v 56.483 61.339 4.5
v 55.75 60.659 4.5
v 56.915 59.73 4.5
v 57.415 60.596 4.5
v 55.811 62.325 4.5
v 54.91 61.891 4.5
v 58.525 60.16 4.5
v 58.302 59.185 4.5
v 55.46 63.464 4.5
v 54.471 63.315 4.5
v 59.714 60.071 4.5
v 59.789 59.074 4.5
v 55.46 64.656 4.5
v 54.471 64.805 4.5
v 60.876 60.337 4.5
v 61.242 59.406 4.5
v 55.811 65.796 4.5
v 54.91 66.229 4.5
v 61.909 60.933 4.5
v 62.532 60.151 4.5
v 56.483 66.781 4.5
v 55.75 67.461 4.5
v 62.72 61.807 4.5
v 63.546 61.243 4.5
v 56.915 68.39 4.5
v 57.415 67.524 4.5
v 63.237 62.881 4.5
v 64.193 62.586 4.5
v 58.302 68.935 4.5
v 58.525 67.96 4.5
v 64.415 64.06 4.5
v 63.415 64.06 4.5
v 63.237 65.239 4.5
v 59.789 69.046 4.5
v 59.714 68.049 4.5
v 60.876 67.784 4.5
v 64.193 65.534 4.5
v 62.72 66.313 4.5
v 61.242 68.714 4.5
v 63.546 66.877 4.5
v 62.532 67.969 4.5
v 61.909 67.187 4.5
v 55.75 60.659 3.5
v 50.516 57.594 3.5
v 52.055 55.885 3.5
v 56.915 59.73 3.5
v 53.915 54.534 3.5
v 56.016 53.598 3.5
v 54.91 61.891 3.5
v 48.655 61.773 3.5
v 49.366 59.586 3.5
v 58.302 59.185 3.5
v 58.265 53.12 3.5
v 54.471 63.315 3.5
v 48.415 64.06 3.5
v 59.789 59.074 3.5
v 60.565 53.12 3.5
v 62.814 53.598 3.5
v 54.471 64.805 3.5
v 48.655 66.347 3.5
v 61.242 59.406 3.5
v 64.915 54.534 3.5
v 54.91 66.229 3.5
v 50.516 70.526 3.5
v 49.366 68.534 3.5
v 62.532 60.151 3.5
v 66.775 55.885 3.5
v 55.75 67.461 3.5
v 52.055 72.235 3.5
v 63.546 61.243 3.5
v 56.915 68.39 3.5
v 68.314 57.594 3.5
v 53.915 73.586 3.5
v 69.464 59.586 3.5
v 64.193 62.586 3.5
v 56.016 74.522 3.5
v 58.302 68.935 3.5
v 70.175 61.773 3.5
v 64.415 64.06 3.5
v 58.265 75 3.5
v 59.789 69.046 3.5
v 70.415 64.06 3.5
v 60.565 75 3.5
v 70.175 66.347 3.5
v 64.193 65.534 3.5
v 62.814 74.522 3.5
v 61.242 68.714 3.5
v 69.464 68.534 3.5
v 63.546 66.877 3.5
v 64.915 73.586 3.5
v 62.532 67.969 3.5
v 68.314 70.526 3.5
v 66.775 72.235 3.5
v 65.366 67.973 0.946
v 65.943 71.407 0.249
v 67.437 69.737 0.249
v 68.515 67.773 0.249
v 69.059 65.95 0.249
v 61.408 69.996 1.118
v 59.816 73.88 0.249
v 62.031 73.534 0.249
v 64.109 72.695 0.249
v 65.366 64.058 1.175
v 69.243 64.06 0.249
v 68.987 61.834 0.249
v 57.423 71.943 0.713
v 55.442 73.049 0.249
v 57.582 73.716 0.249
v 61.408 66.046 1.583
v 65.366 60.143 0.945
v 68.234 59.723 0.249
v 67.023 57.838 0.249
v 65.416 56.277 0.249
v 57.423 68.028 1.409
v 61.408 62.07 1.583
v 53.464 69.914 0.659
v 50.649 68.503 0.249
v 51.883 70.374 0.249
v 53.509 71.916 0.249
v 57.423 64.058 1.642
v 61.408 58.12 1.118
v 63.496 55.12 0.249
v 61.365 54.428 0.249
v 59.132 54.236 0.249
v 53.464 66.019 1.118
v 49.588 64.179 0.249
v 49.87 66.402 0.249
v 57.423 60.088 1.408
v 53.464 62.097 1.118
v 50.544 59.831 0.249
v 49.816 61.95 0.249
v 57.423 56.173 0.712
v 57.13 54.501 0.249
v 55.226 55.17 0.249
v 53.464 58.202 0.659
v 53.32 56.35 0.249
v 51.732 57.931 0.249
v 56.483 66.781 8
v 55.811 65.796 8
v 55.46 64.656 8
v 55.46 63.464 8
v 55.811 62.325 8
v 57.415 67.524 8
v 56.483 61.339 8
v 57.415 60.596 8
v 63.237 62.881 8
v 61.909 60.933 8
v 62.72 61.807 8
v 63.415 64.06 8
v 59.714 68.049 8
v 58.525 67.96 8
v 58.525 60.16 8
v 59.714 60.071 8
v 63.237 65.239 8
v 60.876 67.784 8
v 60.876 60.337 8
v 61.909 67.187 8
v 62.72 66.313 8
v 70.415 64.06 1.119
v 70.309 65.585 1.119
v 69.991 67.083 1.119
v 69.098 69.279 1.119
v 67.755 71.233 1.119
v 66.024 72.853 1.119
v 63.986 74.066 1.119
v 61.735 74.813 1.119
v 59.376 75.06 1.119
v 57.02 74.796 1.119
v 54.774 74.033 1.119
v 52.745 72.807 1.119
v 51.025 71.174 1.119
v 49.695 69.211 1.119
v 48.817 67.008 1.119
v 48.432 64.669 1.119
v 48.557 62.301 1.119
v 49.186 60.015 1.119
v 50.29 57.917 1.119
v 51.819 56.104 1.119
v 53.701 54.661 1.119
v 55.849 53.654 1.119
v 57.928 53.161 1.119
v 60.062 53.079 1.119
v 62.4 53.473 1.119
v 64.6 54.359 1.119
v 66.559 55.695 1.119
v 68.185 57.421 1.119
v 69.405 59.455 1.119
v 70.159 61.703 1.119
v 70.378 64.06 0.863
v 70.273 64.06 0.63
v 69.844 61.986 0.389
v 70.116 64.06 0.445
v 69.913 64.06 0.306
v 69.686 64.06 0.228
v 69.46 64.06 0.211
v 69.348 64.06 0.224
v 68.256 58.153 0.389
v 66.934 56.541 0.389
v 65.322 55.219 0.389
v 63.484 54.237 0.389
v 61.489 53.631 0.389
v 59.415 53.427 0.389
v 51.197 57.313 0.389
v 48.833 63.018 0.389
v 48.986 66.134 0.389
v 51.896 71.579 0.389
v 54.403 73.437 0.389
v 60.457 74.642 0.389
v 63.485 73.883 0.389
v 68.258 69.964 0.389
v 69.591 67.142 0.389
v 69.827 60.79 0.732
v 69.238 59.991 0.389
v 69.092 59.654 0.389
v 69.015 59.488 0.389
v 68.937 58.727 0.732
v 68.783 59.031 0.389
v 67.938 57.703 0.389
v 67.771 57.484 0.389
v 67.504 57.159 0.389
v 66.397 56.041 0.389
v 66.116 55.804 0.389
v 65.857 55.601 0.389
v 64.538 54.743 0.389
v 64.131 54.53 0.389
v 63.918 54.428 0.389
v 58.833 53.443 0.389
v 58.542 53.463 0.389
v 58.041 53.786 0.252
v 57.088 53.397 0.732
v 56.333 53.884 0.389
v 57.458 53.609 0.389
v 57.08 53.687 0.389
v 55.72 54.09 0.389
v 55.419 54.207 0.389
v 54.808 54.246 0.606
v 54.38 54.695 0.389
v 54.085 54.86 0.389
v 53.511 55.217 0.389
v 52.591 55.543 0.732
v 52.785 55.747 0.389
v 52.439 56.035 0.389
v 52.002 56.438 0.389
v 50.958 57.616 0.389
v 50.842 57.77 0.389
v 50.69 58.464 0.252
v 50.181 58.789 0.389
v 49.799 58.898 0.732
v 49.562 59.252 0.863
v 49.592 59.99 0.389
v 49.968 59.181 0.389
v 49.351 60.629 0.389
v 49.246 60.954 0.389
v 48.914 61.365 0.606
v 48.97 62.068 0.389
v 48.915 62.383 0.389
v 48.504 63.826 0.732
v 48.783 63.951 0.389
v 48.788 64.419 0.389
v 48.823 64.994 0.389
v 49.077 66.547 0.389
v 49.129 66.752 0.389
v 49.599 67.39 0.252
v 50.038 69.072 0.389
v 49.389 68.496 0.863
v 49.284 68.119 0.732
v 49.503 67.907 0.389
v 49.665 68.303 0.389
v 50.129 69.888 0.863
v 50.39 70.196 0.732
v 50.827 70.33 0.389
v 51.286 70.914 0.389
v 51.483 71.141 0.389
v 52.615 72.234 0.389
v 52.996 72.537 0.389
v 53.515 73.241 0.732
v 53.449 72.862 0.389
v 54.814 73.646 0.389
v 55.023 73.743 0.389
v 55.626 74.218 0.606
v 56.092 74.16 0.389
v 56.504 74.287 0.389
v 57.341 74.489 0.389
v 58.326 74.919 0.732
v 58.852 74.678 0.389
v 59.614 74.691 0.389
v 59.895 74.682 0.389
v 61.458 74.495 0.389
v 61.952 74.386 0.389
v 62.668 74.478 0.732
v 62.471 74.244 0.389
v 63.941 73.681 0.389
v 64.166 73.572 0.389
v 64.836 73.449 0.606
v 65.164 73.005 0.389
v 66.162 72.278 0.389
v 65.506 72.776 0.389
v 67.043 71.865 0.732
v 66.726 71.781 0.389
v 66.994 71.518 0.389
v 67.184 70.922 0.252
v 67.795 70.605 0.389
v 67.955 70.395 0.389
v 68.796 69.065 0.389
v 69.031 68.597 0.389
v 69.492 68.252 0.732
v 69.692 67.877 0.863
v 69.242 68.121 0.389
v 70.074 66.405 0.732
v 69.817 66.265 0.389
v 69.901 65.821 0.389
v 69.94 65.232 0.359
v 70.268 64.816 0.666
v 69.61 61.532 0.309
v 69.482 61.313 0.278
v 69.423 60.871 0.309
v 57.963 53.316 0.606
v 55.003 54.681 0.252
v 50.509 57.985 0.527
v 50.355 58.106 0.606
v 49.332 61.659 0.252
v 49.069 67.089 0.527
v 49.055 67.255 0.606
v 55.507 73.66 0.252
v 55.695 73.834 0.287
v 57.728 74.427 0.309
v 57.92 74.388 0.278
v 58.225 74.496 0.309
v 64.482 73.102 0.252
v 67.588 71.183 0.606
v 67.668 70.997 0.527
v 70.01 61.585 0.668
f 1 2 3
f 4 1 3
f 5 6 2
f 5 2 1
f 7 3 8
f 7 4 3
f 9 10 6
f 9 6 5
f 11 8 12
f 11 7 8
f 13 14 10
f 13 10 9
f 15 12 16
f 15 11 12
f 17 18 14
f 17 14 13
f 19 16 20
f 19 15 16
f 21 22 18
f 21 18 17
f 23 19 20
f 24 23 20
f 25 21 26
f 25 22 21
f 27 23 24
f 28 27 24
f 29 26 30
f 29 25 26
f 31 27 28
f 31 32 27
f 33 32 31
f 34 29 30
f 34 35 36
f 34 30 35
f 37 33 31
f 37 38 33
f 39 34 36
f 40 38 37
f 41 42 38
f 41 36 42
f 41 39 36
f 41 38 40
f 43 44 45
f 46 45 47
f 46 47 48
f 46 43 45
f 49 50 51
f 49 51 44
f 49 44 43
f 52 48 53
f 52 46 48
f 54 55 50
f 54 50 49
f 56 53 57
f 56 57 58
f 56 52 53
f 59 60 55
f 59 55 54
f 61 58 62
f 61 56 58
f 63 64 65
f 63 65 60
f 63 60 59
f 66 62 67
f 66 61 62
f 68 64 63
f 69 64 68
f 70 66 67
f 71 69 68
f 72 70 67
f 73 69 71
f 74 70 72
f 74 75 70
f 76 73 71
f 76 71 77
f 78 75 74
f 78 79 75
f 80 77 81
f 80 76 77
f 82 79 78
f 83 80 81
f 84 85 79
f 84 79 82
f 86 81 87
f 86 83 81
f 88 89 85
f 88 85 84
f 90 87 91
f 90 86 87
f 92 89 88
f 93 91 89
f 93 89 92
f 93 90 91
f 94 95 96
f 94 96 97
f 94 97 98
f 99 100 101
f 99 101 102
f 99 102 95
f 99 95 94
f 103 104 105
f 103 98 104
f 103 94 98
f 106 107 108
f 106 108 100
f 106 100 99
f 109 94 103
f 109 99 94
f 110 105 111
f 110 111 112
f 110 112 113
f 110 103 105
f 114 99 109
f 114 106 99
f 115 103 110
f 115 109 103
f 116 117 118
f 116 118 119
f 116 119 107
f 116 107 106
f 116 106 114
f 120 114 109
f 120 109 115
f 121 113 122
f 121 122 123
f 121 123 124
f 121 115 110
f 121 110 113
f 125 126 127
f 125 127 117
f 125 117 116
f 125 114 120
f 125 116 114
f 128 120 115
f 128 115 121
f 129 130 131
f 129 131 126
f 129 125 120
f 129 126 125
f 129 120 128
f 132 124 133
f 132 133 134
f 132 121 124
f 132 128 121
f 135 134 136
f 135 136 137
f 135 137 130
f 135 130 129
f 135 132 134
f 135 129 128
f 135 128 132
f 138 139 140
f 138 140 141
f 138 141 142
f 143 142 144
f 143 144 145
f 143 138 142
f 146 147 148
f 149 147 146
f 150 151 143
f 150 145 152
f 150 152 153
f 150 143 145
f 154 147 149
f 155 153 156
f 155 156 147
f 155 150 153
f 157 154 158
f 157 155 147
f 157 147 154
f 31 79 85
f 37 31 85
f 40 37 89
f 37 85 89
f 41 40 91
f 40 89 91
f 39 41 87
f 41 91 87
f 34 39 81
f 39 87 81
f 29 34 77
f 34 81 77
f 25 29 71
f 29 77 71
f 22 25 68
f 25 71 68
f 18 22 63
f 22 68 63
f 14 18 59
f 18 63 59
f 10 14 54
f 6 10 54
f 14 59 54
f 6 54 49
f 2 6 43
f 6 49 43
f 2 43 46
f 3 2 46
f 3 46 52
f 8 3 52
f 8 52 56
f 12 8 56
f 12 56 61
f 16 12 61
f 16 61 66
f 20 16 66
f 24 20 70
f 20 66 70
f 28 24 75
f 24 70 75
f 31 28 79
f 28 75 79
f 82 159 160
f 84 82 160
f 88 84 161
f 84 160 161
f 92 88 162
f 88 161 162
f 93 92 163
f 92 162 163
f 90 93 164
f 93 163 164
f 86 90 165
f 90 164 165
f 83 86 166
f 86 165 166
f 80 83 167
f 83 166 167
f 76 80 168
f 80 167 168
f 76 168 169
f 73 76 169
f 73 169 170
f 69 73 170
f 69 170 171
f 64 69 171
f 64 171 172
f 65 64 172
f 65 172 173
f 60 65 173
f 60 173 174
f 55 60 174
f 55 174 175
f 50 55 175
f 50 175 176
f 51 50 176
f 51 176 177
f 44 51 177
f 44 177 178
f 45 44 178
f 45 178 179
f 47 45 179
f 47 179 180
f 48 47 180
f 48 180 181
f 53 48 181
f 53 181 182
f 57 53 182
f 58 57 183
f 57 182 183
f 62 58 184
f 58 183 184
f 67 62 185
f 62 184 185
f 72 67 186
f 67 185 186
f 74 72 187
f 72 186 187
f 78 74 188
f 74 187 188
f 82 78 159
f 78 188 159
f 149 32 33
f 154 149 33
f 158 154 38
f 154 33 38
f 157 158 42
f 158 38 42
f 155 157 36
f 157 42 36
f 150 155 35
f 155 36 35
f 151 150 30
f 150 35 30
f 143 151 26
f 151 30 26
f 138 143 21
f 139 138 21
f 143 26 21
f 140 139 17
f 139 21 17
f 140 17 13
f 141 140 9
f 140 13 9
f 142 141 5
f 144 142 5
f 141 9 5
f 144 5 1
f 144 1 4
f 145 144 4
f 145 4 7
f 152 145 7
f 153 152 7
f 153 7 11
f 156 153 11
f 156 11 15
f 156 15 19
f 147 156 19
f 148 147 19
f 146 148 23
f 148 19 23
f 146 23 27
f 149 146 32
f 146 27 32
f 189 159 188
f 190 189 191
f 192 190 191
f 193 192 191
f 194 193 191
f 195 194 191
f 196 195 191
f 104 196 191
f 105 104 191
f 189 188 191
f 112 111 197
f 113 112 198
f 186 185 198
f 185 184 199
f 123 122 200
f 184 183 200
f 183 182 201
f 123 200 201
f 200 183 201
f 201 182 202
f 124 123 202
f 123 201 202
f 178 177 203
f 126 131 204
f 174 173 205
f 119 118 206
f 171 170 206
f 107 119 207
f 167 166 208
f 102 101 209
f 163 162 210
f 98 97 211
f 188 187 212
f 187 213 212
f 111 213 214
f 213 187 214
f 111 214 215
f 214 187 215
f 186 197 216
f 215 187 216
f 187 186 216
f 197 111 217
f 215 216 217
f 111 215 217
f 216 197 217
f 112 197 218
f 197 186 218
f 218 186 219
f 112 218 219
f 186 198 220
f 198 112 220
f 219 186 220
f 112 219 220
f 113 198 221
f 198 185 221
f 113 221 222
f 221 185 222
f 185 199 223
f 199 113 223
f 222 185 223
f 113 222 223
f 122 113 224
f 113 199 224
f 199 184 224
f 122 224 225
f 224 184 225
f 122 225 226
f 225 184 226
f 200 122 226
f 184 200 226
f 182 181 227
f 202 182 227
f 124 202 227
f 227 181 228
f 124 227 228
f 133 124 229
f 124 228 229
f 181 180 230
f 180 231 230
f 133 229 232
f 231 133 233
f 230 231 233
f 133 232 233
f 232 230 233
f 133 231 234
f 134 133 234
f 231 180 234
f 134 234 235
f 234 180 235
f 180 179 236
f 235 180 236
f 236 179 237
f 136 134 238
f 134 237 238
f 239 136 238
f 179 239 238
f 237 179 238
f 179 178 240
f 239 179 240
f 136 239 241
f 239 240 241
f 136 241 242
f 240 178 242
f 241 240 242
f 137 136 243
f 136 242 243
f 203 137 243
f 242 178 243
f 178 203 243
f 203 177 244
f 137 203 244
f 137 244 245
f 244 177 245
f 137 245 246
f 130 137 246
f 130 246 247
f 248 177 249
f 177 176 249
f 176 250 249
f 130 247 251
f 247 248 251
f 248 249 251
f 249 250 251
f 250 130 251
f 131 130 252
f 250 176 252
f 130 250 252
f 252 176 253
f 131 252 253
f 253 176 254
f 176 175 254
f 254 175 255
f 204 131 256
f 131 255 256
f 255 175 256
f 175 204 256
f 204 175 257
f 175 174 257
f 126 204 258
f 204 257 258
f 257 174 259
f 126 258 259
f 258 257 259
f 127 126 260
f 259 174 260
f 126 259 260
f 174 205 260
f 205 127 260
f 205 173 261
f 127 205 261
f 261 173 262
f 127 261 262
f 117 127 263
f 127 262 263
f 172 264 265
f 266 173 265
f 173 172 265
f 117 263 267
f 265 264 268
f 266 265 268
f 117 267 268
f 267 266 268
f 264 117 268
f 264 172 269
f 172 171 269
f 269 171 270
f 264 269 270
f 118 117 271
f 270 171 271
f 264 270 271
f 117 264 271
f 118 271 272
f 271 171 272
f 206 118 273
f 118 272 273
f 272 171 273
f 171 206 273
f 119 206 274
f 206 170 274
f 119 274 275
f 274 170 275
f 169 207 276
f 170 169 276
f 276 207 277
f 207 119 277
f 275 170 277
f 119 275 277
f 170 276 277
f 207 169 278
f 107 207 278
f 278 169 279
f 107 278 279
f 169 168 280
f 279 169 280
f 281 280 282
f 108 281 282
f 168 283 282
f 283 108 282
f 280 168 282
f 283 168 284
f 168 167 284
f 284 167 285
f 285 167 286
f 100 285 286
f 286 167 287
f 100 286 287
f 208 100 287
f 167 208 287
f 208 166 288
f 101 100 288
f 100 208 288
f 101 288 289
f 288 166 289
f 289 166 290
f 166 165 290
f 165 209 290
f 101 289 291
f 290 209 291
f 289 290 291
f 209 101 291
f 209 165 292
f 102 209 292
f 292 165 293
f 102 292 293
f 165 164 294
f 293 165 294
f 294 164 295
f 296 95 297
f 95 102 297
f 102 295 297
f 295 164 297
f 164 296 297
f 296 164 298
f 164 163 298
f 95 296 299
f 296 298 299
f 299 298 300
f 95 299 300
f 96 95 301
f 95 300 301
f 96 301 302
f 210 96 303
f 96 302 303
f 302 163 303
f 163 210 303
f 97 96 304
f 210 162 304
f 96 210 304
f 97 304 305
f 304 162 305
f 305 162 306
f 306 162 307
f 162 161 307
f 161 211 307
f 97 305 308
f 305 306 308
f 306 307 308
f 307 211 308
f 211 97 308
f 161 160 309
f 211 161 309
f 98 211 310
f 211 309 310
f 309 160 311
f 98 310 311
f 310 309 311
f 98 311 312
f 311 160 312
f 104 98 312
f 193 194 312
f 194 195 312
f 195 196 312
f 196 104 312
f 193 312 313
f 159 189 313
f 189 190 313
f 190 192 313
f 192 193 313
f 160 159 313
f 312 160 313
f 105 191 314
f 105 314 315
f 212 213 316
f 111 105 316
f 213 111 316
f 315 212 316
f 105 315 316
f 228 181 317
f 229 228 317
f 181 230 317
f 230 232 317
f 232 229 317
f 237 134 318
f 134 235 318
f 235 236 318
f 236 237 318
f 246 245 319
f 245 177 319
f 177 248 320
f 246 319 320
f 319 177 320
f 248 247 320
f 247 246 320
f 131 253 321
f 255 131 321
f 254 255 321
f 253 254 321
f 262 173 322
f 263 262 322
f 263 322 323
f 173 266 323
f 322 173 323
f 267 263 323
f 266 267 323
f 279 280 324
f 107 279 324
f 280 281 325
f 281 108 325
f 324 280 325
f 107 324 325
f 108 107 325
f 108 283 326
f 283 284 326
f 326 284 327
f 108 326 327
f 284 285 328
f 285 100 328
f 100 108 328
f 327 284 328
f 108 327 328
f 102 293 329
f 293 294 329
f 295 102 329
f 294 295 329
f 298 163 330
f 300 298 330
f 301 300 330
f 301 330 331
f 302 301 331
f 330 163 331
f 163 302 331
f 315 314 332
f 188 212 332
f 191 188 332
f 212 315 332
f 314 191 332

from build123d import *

# Parameters (mm, degrees)
F0_R     = 11
F1_DEPTH = 3.5
F2_R     = 5
F3_DEPTH = 1
F4_R     = 4
F5_DEPTH = 3.5
F6_R     = 1.3518679975
F7_DEPTH = 32.3
F11_R    = 0.9092071391


# Not quite as in the source:
# - a fillet or chamfer that OpenCascade refuses, or shapes differently, is made with other operations: its cross-section is extruded or revolved along the edge and cut away or added
# - a feature names something its author has since deleted; it is built from what else it names


with BuildPart() as f1:
    # F0 (on Top) → F1 (new body)
    with BuildSketch(Plane.XY):
        with Locations((59.4149753451, 64.0600547194)):
            Circle(F0_R)
    extrude(amount=F1_DEPTH)

    # F2 (on face) → F3 (join)
    with BuildSketch(Plane.XY.offset(3.5)):
        with Locations((59.4149753451, 64.0600547194)):
            Circle(F2_R)
    extrude(amount=F3_DEPTH)

    # F4 (on face) → F5 (join)
    with BuildSketch(Plane.XY.offset(4.5)):
        with Locations((59.4149753451, 64.0600547194)):
            Circle(F4_R)
    extrude(amount=F5_DEPTH)

    # F6 (on face) → F7 (join)
    with BuildSketch(Plane(origin=(0, 0, 0), x_dir=(1, 0, 0), z_dir=(0, 0, -1))):
        with Locations((59.4149753451, -64.0600547194)):
            Circle(F6_R)
    extrude(amount=F7_DEPTH)

    # F8 (on face) → F9 (revolve, cut)
    with BuildSketch(Plane(origin=(0, 0, -32.3), x_dir=(1, 0, 0), z_dir=(0, 0, -1))):
        with BuildLine():
            Line((60.7668433426, -64.0600547194), (93.4149753451, -64.0600547194))
            ThreePointArc((93.4149753451, -64.0600547194), (59.4149753451, -30.0600547194), (25.4149753451, -64.0600547194))
            Line((25.4149753451, -64.0600547194), (58.0631073476, -64.0600547194))
            ThreePointArc((58.0631073476, -64.0600547194), (59.4149753451, -62.7081867219), (60.7668433426, -64.0600547194))
        make_face()
        with BuildLine():
            Line((59.4149753451, -64.0600547194), (60.7668433426, -64.0600547194))
            ThreePointArc((60.7668433426, -64.0600547194), (59.4149753451, -62.7081867219), (58.0631073476, -64.0600547194))
            Line((58.0631073476, -64.0600547194), (59.4149753451, -64.0600547194))
        make_face()
    revolve(axis=Axis((76.4149753451, 64.0600547194, -32.3), (1, 0, 0)), mode=Mode.SUBTRACT)

    # F10: fillet of radius 5 on 1 edges, made by hand

    # F10_s1 → F10_t2 (revolve, cut)
    with BuildSketch(Plane.YZ.offset(59.4149753451)):
        with BuildLine():
            ThreePointArc((52.67102491, 0), (53.4091792265, 0.0547873448), (54.1311569369, 0.2179487179))
            ThreePointArc((54.1311569369, 0.2179487179), (53.7867795374, 0.1107978463), (53.4435581222, 0))
            Line((53.4435581222, 0), (52.67102491, 0))
        make_face()
    revolve(axis=Axis((59.4149753451, 64.0600547194, 0), (0, 0, 1)), mode=Mode.SUBTRACT)

    # F11
    f11_edges = [f1.edges().sort_by_distance(p)[0] for p in [
        (51.636801, 71.838229, 0.015157),
        (67.19315, 56.28188, 0.015157),
    ]]
    fillet(f11_edges, radius=F11_R)


solid = f1.part
